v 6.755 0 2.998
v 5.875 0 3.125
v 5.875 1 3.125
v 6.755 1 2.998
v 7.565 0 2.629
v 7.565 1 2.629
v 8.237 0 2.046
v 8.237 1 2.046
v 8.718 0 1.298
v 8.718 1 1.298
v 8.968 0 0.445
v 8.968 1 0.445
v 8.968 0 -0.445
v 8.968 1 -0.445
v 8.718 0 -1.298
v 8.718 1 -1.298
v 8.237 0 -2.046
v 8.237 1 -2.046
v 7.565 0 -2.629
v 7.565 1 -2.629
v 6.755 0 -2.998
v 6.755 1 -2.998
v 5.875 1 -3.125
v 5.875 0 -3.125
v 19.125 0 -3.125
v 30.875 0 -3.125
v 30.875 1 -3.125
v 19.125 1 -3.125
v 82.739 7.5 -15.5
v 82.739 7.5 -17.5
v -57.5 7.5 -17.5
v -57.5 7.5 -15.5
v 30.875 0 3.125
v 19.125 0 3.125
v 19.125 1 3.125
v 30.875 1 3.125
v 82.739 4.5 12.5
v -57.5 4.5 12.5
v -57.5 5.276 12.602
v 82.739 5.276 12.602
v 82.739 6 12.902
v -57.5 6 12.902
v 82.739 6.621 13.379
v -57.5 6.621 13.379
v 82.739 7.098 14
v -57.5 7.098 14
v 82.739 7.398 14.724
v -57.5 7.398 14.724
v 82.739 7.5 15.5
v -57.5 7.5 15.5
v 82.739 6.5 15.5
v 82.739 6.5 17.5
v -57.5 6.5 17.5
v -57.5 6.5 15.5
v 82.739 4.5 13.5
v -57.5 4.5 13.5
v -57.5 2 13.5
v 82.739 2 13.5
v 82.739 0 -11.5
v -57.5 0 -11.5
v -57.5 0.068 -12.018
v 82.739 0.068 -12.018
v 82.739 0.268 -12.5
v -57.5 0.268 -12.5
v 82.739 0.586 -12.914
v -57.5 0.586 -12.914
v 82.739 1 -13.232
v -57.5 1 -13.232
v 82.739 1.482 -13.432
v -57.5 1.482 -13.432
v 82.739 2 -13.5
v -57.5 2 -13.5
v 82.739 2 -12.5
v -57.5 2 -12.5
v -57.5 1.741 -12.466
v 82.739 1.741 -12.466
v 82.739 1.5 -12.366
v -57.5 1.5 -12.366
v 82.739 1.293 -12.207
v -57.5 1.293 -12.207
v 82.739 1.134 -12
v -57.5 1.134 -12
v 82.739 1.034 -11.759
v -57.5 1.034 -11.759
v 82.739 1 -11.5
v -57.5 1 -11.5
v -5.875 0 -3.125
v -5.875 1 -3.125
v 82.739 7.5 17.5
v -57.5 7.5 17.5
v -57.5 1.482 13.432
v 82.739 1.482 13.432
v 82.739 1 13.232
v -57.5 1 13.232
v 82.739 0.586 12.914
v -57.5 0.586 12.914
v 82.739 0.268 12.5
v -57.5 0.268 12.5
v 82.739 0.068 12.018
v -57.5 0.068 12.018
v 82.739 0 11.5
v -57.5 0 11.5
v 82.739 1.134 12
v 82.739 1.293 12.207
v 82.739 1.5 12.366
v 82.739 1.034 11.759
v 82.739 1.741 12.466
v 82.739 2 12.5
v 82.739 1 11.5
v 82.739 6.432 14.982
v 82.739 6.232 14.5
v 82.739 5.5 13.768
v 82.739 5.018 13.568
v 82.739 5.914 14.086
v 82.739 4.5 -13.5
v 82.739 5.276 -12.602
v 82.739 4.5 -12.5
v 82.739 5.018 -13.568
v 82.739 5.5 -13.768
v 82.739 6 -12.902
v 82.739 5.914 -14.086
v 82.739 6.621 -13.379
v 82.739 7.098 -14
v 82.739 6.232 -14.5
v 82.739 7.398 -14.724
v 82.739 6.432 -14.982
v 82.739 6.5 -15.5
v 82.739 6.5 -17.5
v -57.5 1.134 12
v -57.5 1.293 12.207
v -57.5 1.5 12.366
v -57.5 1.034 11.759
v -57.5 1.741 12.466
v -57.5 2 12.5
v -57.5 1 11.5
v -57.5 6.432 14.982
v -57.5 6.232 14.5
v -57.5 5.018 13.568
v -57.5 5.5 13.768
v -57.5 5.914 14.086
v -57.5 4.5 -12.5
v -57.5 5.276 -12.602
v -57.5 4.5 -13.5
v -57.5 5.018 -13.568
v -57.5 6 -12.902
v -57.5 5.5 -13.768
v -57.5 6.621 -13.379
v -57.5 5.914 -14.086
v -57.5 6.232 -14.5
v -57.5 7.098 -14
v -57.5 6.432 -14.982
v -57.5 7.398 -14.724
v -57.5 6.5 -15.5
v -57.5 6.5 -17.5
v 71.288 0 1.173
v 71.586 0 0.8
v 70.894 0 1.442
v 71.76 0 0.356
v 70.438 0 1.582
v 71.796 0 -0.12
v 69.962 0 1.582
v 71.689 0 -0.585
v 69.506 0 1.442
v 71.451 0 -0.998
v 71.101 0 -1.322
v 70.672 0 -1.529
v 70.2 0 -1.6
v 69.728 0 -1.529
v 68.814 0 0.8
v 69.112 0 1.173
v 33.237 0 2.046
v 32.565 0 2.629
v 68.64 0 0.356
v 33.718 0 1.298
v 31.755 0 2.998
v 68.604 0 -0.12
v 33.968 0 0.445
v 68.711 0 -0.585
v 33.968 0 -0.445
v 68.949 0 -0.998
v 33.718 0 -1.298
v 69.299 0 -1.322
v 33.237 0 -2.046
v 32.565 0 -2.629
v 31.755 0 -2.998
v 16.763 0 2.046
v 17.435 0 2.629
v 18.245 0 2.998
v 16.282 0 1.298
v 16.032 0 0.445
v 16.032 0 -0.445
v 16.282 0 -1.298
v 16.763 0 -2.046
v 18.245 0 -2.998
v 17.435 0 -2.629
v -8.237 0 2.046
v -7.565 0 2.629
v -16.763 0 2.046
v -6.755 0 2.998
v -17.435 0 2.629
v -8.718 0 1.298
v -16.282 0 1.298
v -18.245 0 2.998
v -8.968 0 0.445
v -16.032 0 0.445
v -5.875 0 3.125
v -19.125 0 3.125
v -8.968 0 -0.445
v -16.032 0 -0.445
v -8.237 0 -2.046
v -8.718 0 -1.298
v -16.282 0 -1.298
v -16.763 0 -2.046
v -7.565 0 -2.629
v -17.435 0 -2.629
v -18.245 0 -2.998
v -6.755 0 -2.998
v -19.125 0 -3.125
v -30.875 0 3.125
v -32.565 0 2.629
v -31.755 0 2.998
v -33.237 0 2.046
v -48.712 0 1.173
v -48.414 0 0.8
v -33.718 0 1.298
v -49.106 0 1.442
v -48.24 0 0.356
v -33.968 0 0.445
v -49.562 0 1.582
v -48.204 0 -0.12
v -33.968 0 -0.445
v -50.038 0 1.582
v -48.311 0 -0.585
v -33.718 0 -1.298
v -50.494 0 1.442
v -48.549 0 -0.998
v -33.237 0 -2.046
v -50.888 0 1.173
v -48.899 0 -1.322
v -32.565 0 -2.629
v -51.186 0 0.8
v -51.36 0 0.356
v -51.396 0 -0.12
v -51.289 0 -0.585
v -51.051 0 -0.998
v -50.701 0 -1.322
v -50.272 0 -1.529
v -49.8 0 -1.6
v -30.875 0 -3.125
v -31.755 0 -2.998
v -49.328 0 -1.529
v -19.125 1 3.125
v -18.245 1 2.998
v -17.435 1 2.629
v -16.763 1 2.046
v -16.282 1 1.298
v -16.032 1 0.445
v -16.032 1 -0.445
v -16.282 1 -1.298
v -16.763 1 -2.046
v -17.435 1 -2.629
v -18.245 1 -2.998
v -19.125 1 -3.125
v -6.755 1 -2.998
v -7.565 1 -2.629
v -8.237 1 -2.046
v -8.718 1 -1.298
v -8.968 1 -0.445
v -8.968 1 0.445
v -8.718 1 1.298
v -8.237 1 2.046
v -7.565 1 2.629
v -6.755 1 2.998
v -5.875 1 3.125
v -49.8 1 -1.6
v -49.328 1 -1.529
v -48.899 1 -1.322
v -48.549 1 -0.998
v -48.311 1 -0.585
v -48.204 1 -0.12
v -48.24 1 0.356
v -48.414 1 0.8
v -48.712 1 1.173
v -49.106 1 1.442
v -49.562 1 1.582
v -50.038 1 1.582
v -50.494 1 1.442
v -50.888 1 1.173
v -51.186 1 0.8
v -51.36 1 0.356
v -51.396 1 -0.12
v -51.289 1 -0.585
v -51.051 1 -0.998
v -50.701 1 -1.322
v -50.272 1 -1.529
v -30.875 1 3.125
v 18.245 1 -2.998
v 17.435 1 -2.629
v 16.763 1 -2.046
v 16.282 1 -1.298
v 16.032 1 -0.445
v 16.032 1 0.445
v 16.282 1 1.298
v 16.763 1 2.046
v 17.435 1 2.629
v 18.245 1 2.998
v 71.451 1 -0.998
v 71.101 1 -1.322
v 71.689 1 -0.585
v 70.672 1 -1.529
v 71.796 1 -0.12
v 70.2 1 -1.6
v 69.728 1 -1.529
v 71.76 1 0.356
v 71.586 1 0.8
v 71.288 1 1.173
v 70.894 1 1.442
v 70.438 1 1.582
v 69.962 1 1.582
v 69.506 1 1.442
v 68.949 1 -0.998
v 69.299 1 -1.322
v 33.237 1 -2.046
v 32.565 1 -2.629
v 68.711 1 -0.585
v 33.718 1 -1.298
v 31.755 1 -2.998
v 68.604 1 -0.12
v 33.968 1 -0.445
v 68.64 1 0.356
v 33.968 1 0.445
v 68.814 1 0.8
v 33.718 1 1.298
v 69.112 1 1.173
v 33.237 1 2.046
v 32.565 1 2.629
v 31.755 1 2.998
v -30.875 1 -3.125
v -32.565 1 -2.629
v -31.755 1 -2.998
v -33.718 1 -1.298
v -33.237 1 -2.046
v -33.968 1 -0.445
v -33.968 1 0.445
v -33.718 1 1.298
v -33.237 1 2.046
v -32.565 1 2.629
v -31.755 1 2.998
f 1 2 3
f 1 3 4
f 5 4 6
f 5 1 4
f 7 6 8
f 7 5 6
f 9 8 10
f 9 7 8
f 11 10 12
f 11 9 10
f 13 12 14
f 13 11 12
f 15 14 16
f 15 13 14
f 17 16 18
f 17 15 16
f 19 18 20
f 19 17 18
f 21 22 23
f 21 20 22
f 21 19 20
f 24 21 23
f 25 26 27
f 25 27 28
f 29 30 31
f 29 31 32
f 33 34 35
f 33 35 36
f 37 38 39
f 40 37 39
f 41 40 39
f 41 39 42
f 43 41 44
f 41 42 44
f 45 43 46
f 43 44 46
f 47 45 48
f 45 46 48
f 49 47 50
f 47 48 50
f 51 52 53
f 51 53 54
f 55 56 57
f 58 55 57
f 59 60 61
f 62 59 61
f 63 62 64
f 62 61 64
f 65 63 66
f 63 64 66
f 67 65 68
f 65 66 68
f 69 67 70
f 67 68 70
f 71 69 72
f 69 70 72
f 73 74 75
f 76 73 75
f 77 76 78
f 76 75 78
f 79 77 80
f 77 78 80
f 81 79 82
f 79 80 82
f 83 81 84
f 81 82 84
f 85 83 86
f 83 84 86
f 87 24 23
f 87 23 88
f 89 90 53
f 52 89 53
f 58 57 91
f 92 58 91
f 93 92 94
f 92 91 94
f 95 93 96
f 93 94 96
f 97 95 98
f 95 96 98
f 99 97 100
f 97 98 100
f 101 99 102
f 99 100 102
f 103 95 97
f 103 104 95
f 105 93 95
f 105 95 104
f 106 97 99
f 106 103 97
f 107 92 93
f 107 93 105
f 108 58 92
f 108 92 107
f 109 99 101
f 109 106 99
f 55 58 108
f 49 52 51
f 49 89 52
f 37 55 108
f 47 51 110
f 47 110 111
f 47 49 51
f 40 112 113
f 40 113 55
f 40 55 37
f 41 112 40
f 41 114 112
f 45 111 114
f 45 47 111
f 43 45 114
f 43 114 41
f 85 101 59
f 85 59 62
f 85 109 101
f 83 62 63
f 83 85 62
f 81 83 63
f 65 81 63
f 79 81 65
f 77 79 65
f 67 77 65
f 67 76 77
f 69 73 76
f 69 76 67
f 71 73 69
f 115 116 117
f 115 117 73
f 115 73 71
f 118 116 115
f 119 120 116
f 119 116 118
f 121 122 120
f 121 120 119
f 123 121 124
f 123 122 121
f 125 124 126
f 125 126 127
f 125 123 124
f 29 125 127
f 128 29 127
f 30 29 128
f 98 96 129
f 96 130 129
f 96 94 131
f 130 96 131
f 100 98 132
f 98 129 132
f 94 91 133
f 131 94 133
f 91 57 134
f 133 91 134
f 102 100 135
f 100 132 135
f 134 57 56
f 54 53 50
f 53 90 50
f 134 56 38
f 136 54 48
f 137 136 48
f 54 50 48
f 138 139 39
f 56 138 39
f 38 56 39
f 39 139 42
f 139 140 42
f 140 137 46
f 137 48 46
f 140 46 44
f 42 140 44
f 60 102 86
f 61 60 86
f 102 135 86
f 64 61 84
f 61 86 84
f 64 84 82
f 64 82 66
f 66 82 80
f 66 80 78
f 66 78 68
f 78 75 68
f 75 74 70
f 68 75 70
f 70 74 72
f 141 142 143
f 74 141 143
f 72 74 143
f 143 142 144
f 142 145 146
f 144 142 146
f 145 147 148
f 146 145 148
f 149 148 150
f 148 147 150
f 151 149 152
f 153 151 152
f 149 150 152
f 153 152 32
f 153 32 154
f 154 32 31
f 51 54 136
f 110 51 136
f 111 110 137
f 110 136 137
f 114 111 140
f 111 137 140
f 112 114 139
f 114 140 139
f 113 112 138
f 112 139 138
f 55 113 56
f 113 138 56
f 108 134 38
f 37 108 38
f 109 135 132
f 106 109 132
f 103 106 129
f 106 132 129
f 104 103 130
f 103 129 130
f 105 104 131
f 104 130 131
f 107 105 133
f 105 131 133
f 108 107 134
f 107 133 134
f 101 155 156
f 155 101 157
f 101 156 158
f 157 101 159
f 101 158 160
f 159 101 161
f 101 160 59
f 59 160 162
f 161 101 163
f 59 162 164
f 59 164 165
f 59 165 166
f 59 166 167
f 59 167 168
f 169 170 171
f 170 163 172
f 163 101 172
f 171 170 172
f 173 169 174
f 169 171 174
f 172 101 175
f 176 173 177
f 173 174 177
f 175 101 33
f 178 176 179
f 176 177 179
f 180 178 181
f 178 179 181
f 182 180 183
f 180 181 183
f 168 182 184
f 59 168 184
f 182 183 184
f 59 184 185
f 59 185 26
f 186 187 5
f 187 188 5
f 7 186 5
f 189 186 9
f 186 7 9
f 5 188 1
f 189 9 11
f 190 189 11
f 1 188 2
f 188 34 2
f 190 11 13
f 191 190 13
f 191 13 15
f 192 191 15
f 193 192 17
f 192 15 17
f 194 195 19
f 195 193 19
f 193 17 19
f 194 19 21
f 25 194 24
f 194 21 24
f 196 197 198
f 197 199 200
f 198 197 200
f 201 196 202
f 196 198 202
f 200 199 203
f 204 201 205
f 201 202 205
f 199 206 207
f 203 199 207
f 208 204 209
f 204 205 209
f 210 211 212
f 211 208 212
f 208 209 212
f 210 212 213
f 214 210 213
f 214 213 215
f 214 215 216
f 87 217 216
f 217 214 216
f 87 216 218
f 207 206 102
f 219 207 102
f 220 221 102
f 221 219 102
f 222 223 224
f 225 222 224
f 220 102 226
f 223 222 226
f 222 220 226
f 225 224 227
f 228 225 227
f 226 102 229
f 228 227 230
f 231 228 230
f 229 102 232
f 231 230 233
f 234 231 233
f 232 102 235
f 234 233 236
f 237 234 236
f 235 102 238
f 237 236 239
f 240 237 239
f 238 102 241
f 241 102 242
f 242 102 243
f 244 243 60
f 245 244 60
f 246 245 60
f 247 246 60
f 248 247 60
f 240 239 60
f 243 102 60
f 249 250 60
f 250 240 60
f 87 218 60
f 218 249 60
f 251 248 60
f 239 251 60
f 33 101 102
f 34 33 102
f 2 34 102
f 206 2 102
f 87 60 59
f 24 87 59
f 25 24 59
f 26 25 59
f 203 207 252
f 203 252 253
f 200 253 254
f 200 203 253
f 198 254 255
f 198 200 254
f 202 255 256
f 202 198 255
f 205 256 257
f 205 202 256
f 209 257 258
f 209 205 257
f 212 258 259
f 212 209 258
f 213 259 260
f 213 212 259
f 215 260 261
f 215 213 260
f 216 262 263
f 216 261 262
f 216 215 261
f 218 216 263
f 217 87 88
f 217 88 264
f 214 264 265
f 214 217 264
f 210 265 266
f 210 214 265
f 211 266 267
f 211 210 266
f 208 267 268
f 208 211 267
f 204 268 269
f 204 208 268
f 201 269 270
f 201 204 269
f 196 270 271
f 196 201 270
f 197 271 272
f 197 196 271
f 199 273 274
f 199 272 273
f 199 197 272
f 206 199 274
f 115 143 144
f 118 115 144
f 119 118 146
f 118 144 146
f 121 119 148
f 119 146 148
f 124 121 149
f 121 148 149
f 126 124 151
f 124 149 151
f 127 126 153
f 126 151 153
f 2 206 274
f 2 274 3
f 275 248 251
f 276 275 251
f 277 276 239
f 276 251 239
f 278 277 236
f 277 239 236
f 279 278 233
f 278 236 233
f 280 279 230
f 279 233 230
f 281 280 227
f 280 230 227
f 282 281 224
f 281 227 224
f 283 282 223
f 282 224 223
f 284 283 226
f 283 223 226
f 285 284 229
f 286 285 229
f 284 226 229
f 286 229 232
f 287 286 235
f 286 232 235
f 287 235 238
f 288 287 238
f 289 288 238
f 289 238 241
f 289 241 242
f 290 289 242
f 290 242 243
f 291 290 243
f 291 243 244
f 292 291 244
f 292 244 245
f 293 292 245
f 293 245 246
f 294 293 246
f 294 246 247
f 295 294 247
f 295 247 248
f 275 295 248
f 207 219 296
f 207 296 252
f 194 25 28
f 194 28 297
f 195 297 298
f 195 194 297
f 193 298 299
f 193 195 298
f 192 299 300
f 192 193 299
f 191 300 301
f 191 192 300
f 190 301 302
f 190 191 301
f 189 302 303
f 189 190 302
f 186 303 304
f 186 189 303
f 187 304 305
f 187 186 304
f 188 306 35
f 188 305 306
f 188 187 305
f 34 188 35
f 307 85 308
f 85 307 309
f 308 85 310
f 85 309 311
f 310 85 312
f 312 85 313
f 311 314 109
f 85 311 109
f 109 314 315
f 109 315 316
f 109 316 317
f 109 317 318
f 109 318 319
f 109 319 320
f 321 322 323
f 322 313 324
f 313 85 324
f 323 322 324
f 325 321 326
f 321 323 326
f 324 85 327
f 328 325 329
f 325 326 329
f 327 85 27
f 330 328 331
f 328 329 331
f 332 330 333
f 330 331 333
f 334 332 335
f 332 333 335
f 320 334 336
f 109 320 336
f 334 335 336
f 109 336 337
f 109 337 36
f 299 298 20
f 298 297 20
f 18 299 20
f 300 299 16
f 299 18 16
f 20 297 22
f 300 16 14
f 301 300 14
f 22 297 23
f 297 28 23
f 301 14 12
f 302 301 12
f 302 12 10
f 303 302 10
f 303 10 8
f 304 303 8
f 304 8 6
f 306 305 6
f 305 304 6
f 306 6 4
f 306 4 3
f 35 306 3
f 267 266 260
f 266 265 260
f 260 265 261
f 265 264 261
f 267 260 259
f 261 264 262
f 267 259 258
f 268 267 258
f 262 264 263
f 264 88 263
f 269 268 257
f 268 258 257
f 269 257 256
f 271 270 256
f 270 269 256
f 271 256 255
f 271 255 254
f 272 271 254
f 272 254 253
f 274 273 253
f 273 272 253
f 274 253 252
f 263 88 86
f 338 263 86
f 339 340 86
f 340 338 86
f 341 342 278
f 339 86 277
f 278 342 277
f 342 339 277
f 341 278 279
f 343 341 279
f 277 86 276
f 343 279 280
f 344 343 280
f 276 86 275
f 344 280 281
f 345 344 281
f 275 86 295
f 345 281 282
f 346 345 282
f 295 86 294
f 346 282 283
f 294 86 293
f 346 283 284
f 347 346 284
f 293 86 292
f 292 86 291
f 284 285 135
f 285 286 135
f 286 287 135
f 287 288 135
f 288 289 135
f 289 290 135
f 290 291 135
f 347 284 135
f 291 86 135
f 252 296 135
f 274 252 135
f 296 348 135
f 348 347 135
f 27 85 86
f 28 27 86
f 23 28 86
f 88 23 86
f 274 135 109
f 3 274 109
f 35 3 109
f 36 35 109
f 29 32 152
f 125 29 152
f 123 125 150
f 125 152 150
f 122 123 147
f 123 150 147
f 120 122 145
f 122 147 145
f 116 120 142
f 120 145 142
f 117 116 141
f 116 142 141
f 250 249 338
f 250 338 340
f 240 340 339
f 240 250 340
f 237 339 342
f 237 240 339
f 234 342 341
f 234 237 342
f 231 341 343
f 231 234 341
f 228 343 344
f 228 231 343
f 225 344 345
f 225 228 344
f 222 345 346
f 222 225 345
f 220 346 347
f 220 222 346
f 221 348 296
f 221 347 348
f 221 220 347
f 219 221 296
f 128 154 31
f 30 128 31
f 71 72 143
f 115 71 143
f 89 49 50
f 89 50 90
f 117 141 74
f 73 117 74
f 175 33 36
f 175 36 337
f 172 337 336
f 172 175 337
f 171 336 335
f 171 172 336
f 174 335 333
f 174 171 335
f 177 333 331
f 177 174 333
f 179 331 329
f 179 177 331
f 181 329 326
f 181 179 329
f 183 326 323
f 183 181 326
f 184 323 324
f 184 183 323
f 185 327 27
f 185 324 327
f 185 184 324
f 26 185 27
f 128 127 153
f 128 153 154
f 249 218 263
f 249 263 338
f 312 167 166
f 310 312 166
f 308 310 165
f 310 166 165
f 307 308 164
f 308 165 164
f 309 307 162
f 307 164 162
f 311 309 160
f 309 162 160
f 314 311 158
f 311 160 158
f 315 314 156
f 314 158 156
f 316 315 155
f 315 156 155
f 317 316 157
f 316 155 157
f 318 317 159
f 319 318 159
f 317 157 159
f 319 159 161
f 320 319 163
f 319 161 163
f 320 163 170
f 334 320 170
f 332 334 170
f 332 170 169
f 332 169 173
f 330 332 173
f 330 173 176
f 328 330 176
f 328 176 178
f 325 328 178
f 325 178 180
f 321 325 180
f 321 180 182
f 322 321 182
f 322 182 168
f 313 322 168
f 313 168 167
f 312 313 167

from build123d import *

# Parameters (mm, degrees)
EXTRUDE_THIN1_DEPTH        = 82.739
EXTRUDE_THIN1_DEPTH_BACK   = 57.5
CUT_EXTRUDE1_REACH         = 86.901
LPATTERN1_COUNT            = 2
LPATTERN1_PITCH            = 25
LPATTERN1_COL_COUNT        = 2
LPATTERN1_COL_PITCH        = 25
SZKIC1_R                   = 1.6
WYTNIJ_WYCI_GNI_CIE1_DEPTH = 85.901367015


with BuildPart() as part:
    # Sketch1 → Extrude-Thin1 (new, two sides: drawn at the far end of the back side and taken through both)
    with BuildSketch(Plane(origin=(0, 0, 0), x_dir=(0, 0, -1), z_dir=(1, 0, 0)).offset(-EXTRUDE_THIN1_DEPTH_BACK)):
        with BuildLine():
            Line((-17.5, 6.5), (-15.5, 6.5))
            ThreePointArc((-15.5, 6.5), (-14.085786438, 5.914213562), (-13.5, 4.5))
            Line((-13.5, 4.5), (-13.5, 2))
            ThreePointArc((-13.5, 2), (-12.914213562, 0.585786438), (-11.5, 0))
            Line((-11.5, 0), (11.5, 0))
            ThreePointArc((11.5, 0), (12.914213562, 0.585786438), (13.5, 2))
            Line((13.5, 2), (13.5, 4.5))
            ThreePointArc((13.5, 4.5), (14.085786438, 5.914213562), (15.5, 6.5))
            Line((15.5, 6.5), (17.5, 6.5))
            Line((17.5, 6.5), (17.5, 7.5))
            Line((17.5, 7.5), (15.5, 7.5))
            ThreePointArc((15.5, 7.5), (13.378679656, 6.621320344), (12.5, 4.5))
            Line((12.5, 4.5), (12.5, 2))
            ThreePointArc((12.5, 2), (12.207106781, 1.292893219), (11.5, 1))
            Line((11.5, 1), (-11.5, 1))
            ThreePointArc((-11.5, 1), (-12.207106781, 1.292893219), (-12.5, 2))
            Line((-12.5, 2), (-12.5, 4.5))
            ThreePointArc((-12.5, 4.5), (-13.378679656, 6.621320344), (-15.5, 7.5))
            Line((-15.5, 7.5), (-17.5, 7.5))
            Line((-17.5, 7.5), (-17.5, 6.5))
        make_face()
    extrude(amount=EXTRUDE_THIN1_DEPTH + EXTRUDE_THIN1_DEPTH_BACK)

    # Sketch2 → Cut-Extrude1 (cut, up to next)
    with BuildSketch(Plane.XZ, mode=Mode.PRIVATE) as cut_extrude1_sk1:
        with BuildLine():
            Line((-5.875, 3.125), (5.875, 3.125))
            ThreePointArc((5.875, 3.125), (9, 0), (5.875, -3.125))
            Line((5.875, -3.125), (-5.875, -3.125))
            ThreePointArc((-5.875, -3.125), (-9, 0), (-5.875, 3.125))
        make_face()
    cut_extrude1_tool1 = extrude(cut_extrude1_sk1.sketch, amount=-CUT_EXTRUDE1_REACH, mode=Mode.PRIVATE) & part.part
    cut_extrude1 = cut_extrude1_tool1.solids().sort_by_distance((0, 0, 0))[0]
    add(cut_extrude1, mode=Mode.SUBTRACT)

    # LPattern1: Cut-Extrude1 ×2
    with Locations(*[(i * LPATTERN1_PITCH, 0, 0) for i in range(1, LPATTERN1_COUNT)]):
        add(cut_extrude1, mode=Mode.SUBTRACT)

    # LPattern1 col: Cut-Extrude1 ×2
    with Locations(*[(-i * LPATTERN1_COL_PITCH, 0, 0) for i in range(1, LPATTERN1_COL_COUNT)]):
        add(cut_extrude1, mode=Mode.SUBTRACT)

    # Szkic1 → Wytnij-wyciągnięcie1 (cut, through all)
    with BuildSketch(Plane.XZ):
        with Locations(Location((70.2, 0, 0), (0, 0, 270))):
            Circle(SZKIC1_R)
        with Locations(Location((-49.8, 0, 0), (0, 0, 270))):
            Circle(SZKIC1_R)
    extrude(amount=-WYTNIJ_WYCI_GNI_CIE1_DEPTH, mode=Mode.SUBTRACT)


solid = part.part
